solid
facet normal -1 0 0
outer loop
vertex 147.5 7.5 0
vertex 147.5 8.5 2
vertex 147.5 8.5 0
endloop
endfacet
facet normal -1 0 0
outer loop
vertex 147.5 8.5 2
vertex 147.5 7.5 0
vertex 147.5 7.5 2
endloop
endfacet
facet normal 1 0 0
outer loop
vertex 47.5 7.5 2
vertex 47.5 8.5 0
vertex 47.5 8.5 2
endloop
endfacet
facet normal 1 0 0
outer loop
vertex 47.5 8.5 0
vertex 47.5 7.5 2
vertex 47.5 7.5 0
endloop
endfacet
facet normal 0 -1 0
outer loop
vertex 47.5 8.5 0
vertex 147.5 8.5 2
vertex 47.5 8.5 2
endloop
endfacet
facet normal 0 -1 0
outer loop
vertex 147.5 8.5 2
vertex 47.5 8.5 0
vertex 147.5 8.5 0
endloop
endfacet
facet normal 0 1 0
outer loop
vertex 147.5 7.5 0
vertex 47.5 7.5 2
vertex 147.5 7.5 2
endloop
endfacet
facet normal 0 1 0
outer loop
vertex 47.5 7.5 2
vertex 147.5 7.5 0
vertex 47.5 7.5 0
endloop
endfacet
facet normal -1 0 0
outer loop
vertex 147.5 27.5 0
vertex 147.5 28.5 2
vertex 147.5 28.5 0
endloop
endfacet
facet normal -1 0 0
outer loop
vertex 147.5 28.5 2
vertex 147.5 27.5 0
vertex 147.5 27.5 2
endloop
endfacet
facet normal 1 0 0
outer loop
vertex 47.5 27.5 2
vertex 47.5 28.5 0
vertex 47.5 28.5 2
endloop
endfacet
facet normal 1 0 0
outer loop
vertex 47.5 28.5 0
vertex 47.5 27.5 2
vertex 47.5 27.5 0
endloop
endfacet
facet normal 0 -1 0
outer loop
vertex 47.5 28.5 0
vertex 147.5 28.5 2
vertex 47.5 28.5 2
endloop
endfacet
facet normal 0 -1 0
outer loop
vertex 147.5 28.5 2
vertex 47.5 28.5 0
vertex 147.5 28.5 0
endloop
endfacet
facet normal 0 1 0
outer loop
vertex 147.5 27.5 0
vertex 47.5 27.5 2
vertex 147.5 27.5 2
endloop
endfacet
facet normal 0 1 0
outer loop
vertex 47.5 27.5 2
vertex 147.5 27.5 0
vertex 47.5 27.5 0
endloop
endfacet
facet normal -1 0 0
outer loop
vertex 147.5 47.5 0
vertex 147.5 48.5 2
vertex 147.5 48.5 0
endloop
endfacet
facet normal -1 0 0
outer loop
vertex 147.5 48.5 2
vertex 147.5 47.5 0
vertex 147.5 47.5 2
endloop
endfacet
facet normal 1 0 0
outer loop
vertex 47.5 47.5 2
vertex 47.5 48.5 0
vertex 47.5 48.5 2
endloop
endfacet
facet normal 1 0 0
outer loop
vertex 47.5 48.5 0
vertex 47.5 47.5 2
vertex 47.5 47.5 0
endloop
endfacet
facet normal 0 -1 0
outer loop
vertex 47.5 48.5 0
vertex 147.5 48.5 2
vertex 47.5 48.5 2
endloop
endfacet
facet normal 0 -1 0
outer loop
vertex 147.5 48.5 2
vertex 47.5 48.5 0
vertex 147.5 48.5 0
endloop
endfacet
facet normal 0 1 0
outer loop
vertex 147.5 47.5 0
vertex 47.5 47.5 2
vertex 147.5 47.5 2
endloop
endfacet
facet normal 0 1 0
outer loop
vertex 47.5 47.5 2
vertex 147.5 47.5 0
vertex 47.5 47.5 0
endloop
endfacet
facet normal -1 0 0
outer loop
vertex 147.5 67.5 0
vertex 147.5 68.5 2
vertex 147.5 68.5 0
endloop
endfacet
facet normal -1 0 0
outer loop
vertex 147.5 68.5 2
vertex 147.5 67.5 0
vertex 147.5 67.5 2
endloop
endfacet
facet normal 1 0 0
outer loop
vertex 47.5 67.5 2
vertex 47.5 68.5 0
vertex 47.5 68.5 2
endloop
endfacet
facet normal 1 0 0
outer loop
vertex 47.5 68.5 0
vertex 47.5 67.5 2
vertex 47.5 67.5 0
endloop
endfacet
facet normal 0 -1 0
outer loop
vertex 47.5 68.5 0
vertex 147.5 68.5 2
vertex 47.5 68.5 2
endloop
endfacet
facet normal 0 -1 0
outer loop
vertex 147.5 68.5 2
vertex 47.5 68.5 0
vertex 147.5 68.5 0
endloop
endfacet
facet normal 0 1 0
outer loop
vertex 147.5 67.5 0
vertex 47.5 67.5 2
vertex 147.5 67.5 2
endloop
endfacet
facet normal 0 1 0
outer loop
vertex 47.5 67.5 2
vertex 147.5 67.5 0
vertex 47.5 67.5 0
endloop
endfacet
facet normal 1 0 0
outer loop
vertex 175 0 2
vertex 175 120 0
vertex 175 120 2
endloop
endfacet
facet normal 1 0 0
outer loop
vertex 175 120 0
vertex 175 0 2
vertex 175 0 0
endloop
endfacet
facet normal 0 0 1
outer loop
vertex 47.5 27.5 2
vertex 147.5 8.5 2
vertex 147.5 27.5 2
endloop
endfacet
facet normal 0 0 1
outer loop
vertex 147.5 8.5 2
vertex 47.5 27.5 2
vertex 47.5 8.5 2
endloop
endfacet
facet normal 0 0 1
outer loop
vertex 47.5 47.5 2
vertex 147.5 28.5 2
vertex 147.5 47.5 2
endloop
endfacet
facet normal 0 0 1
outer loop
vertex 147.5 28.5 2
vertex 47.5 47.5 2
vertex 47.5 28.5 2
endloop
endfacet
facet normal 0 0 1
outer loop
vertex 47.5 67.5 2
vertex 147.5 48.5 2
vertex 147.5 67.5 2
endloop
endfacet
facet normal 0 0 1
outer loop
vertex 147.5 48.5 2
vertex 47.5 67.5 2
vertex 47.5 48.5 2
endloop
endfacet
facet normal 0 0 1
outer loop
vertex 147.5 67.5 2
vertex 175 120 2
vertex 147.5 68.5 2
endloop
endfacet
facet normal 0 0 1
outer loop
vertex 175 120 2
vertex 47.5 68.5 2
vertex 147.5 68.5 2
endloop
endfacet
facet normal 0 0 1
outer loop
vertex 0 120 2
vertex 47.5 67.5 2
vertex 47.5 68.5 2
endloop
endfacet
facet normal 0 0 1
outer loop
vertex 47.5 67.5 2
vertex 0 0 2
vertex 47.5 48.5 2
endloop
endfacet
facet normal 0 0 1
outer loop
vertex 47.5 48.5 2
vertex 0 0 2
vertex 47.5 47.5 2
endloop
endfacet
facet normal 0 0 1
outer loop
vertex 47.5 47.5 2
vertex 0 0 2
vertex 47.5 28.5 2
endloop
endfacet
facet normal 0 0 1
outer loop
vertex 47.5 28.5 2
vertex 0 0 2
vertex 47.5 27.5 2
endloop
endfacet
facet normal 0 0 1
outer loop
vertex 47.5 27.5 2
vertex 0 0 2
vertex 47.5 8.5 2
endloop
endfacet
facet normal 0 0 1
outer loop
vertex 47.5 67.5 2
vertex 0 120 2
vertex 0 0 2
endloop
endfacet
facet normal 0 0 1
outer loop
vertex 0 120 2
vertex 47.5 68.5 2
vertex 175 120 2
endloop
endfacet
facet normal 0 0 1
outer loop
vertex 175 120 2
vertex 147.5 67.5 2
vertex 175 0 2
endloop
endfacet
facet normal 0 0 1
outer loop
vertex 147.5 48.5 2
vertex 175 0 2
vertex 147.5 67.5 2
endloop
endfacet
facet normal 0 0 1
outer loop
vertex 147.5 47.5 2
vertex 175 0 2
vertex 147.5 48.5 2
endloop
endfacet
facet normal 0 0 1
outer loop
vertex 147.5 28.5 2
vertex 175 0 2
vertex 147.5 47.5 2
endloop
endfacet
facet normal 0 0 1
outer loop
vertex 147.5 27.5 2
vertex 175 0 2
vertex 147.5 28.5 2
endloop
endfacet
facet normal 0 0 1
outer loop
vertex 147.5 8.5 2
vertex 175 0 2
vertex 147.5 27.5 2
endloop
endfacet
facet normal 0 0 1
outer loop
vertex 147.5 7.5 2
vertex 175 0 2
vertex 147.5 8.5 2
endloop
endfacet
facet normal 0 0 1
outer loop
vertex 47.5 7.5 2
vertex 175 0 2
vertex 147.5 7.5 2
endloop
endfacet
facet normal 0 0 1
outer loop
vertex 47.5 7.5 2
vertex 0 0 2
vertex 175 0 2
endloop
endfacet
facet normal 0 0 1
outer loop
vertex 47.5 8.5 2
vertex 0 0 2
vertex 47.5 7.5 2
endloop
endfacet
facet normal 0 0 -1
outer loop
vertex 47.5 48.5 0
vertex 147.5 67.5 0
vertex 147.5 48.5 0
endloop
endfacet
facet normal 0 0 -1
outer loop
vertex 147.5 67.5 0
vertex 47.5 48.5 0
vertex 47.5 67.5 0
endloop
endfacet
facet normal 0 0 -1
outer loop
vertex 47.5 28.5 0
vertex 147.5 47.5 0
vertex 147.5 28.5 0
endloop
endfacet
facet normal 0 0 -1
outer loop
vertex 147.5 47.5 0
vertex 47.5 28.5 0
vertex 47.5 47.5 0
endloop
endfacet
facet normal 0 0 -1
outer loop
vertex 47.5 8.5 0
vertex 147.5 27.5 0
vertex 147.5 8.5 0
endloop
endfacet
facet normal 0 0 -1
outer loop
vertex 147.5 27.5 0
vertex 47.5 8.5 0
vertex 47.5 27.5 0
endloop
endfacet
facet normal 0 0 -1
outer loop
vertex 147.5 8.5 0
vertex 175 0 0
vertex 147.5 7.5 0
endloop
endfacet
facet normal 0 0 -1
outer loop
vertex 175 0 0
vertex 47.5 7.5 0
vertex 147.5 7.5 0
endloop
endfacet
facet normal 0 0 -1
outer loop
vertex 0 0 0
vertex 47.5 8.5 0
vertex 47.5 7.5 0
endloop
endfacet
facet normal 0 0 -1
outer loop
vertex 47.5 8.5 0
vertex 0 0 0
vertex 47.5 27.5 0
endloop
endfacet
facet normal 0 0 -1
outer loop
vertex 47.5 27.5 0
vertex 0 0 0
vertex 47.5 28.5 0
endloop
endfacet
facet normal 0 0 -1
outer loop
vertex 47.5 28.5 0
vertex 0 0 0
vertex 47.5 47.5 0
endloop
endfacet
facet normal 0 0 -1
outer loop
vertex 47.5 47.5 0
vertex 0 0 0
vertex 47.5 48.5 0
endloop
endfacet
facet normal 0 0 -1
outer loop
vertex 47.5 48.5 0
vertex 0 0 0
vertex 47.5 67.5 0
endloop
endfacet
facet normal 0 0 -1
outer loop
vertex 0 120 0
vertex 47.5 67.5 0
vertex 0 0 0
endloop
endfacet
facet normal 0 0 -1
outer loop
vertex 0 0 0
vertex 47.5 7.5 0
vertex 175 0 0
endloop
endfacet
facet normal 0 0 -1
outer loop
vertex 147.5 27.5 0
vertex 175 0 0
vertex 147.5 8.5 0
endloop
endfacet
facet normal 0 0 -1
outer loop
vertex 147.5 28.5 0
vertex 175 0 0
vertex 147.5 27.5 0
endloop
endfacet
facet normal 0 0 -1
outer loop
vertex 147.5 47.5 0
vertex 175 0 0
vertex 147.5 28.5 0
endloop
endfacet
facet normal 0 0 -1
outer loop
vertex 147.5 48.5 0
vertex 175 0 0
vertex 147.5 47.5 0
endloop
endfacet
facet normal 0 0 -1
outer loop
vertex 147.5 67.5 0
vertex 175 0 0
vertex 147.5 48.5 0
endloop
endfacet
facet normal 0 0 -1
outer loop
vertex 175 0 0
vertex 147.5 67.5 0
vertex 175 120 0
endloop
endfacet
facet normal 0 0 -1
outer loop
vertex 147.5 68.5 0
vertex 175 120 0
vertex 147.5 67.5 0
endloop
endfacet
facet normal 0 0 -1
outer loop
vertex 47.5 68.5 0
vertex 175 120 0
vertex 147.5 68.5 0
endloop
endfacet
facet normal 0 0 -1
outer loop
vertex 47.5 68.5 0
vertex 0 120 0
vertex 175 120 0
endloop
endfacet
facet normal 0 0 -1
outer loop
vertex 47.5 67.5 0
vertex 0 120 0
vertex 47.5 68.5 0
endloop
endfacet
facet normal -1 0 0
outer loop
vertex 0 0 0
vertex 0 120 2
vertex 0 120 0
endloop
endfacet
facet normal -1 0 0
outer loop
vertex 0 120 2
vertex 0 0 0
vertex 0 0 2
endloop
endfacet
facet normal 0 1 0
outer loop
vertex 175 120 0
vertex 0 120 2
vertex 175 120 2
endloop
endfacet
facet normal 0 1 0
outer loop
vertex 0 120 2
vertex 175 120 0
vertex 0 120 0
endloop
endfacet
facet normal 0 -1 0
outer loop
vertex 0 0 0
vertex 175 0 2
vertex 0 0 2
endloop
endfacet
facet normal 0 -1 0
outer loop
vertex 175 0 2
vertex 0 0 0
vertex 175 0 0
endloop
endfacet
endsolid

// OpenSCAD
module fader() {
    translate([160/2,16/2,7/2])
    difference() {
        union(){
            // Body
            cube([160, 16, 7], center=true);
            // Slider slot
            translate([12.5,0,6.5])
            cube([100, 1, 5], center=true);
        }
        union() {
            // Mounting holes
            translate([77.15,0,-5])
            #cylinder(r=1.5, h=20);
            translate([-77.15,0,-5])
            #cylinder(r=1.5, h=20);   
        }
    };
}

module box() {
    wall = 2;
    difference() {
        cube([170, 100, 35]);
        
        translate([wall/2, wall/2, wall+0.1])
        cube([170-wall, 100-wall, 35-wall]);
    }
    translate([6,6,0])
    cylinder(r=6, h=35-wall);
    
    translate([0+6,100-6,0])
    cylinder(r=6, h=35-wall);
    
    translate([170-6,6,0])
    difference() {
        cylinder(r=6, h=35-wall);
        translate([0,0,25])
        cylinder(r=3,h=10);
    }
    translate([170-6,100-6,0])
    cylinder(r=6, h=35-wall);
}

// Parameters


module frontPanel() {
    difference() {
        cube([175,120,2]);
        translate([5, 0, -8]) {
            for (i = [0:3]) {
                translate([0, i * 20, 0])
                fader();
            }   
        }
    }

}



frontPanel();

// ArduinoMount
// FaderMount


//sbox();
